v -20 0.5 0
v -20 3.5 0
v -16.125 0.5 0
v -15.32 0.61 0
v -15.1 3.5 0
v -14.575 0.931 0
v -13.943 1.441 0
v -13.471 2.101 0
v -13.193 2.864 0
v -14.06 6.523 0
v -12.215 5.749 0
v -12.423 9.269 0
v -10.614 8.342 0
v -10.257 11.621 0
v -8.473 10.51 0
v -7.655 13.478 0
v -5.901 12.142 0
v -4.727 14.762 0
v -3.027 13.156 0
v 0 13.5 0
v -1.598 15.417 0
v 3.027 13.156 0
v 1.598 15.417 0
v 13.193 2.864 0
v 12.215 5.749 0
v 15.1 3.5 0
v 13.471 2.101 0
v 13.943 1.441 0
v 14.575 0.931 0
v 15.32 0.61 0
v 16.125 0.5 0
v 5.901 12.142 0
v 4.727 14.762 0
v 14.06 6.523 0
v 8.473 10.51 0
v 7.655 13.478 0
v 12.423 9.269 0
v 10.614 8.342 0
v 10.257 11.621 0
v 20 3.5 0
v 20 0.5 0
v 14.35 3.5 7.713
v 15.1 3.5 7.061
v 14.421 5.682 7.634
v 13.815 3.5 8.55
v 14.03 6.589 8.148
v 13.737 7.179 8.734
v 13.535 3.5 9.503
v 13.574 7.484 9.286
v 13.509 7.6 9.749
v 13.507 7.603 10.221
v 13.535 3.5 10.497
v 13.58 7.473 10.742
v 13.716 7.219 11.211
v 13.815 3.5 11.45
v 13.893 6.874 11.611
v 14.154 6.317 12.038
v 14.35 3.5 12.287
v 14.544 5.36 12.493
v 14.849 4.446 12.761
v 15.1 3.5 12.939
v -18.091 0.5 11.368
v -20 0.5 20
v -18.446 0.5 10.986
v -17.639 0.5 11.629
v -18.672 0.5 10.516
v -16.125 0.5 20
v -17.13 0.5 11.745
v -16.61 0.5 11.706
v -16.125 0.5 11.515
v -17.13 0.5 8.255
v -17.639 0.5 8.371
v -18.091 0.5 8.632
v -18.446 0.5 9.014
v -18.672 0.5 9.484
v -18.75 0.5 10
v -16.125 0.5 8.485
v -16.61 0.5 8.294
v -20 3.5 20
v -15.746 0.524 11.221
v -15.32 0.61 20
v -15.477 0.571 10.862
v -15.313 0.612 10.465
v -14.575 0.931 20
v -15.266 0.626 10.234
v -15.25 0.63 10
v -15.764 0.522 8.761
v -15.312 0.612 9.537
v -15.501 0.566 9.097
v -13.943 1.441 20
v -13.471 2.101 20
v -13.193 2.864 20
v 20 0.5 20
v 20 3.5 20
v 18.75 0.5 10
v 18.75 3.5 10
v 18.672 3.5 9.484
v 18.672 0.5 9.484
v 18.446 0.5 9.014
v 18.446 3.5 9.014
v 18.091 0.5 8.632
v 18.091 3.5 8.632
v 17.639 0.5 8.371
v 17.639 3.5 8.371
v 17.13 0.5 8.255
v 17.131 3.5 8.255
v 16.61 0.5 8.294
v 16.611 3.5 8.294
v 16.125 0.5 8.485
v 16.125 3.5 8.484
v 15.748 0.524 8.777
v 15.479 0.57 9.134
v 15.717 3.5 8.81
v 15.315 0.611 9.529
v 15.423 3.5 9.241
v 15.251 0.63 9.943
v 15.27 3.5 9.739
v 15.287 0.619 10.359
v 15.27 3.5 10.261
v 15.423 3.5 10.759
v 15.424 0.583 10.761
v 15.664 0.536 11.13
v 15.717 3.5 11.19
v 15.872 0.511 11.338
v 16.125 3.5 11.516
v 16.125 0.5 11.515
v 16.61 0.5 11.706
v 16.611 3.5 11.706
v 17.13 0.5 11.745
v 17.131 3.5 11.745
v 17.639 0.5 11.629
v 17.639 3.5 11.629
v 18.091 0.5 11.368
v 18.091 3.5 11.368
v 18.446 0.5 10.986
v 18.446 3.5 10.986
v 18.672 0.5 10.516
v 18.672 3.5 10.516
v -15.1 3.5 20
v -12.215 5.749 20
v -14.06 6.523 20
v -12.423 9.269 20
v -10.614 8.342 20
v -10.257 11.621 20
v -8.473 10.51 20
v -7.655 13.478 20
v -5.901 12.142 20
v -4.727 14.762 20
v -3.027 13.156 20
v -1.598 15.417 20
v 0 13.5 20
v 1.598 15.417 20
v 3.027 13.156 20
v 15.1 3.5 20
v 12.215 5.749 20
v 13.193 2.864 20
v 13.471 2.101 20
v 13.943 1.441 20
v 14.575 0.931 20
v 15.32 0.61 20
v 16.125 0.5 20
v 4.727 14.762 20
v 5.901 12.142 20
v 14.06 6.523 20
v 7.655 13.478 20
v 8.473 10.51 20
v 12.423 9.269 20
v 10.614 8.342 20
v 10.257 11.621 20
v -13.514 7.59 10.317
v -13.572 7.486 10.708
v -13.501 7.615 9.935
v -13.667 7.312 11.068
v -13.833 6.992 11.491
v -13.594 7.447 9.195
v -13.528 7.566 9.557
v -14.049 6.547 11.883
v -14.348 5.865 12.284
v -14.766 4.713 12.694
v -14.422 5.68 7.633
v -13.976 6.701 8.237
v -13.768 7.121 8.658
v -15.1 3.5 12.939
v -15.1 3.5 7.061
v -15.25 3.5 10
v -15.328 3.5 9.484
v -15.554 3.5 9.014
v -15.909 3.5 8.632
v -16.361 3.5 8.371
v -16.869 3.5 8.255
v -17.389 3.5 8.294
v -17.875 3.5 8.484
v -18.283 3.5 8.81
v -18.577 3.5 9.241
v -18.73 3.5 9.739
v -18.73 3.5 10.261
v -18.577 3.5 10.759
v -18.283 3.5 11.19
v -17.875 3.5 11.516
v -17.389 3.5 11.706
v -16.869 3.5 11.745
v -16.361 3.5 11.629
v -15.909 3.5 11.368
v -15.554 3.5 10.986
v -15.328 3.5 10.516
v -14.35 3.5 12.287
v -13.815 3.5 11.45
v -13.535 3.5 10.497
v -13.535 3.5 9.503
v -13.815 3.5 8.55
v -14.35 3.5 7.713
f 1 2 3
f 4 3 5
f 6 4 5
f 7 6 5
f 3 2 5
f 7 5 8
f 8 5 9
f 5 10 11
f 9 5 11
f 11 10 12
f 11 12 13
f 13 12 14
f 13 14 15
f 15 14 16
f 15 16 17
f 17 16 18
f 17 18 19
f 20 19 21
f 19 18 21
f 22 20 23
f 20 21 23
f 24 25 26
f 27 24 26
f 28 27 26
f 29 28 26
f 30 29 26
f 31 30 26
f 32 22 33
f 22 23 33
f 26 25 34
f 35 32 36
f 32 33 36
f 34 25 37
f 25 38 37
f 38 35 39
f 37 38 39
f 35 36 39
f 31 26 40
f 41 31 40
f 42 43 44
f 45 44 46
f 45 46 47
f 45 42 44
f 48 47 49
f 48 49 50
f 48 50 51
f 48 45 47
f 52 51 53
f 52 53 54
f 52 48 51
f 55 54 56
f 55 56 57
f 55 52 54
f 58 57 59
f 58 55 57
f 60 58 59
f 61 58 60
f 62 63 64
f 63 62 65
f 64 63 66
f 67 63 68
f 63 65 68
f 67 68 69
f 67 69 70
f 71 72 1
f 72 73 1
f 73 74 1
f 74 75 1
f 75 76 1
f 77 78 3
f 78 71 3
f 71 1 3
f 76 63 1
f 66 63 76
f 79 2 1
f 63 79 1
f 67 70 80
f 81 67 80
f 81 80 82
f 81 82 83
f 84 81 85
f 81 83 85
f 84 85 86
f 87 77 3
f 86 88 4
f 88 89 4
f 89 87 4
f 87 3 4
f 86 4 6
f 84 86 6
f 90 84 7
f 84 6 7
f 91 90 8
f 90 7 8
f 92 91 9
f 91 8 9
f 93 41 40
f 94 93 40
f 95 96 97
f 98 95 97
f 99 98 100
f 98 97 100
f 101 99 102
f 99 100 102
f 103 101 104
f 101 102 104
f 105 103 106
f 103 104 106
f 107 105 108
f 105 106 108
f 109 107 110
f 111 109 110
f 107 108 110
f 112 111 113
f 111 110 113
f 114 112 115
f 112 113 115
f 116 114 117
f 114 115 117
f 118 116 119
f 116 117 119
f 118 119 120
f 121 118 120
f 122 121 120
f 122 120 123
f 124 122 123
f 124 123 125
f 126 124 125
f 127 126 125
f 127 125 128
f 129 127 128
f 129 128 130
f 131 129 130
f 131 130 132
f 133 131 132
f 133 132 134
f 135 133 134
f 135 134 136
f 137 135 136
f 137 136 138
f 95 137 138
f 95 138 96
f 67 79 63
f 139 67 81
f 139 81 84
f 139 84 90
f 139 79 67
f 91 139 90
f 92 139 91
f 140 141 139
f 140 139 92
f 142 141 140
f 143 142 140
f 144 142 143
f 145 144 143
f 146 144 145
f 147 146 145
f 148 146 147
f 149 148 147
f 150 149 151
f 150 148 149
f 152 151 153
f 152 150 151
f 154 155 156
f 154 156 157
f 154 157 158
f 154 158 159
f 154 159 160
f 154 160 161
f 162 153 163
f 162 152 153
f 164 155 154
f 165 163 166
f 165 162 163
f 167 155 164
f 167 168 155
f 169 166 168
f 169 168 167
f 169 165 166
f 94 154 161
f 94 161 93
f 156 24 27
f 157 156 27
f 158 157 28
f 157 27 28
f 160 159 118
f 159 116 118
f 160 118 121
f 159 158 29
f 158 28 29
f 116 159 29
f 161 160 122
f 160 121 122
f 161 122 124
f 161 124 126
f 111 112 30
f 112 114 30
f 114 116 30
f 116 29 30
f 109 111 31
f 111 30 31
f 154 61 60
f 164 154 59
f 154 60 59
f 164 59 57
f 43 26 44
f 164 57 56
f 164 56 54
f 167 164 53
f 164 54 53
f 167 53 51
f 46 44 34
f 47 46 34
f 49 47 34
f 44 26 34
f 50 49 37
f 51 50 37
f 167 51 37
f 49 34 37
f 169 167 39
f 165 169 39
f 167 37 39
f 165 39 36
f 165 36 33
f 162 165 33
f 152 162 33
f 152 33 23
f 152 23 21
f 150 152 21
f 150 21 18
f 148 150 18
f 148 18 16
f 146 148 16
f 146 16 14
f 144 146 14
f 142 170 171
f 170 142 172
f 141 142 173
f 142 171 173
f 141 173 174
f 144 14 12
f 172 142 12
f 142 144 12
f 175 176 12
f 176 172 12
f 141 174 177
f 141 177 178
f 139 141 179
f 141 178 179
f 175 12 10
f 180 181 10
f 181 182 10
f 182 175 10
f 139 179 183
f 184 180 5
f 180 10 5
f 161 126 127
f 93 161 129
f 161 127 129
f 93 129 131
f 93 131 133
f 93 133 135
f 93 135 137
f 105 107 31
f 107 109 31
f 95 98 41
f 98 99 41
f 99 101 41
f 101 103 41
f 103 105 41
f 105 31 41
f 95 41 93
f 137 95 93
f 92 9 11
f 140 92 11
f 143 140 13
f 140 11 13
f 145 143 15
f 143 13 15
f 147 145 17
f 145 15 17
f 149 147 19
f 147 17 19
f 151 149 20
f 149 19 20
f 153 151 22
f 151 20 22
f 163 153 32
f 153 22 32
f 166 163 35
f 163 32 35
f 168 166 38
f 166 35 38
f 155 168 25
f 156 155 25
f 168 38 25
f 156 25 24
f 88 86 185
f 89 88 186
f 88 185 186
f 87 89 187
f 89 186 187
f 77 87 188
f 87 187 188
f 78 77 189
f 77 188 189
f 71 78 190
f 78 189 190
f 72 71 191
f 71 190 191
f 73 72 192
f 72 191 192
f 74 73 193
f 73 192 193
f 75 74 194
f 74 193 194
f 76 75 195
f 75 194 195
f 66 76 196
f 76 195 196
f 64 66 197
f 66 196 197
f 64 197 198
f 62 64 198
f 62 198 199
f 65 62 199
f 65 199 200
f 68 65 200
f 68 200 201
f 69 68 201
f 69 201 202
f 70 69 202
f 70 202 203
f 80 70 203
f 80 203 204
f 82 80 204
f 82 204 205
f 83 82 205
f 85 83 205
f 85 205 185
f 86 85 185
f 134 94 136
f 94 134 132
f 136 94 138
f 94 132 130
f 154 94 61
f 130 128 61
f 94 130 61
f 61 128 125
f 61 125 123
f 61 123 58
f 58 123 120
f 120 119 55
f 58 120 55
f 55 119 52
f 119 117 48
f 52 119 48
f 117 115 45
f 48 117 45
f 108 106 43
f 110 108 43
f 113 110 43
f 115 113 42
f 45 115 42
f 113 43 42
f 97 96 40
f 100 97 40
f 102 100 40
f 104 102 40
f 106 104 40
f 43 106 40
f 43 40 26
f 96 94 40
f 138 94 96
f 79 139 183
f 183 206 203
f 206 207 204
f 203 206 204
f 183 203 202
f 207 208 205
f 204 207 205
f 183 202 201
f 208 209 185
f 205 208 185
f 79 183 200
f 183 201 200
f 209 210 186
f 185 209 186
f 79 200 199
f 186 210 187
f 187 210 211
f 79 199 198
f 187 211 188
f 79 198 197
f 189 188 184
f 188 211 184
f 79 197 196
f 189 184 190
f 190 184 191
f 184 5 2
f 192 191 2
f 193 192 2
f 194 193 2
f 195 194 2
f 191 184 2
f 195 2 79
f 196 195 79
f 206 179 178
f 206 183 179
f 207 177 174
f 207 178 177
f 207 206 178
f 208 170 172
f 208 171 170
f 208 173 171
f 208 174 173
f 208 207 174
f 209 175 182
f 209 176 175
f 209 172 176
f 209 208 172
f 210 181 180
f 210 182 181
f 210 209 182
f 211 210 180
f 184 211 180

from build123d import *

# Parameters (mm, degrees)
BOSS_EXTRU_2_DEPTH      = 20
ESQUISSE3_R             = 1.75
ENL_V_MAT_EXTRU_2_DEPTH = 4
ESQUISSE4_R             = 3.5
ENL_V_MAT_EXTRU_3_DEPTH = 13


with BuildPart() as part:
    # Esquisse1 → Boss.-Extru.2 (new body)
    with BuildSketch(Plane.XY):
        with BuildLine():
            Line((-20, 0.5), (-16.124515497, 0.5))
            ThreePointArc((-16.124515497, 0.5), (-14.241577753, 1.164503168), (-13.192785406, 2.863636364))
            ThreePointArc((-13.192785406, 2.863636364), (0, 13.5), (13.192785406, 2.863636364))
            ThreePointArc((13.192785406, 2.863636364), (14.241577753, 1.164503168), (16.124515497, 0.5))
            Line((16.124515497, 0.5), (20, 0.5))
            Line((20, 0.5), (20, 3.5))
            Line((20, 3.5), (15.099668871, 3.5))
            ThreePointArc((15.099668871, 3.5), (0, 15.5), (-15.099668871, 3.5))
            Line((-15.099668871, 3.5), (-20, 3.5))
            Line((-20, 3.5), (-20, 0.5))
        make_face()
    extrude(amount=BOSS_EXTRU_2_DEPTH)

    # Esquisse3 → Enlèv. mat.-Extru.2 (cut, through all)
    with BuildSketch(Plane(origin=(0, 3.5, 0), x_dir=(1, 0, 0), z_dir=(0, 1, 0))):
        with Locations((-17, -10)):
            Circle(ESQUISSE3_R)
        with Locations((17, -10)):
            Circle(ESQUISSE3_R)
    extrude(amount=-ENL_V_MAT_EXTRU_2_DEPTH, mode=Mode.SUBTRACT)

    # Esquisse4 → Enlèv. mat.-Extru.3 (cut, through all)
    with BuildSketch(Plane(origin=(0, 3.5, 0), x_dir=(1, 0, 0), z_dir=(0, 1, 0))):
        with Locations((-17, -10)):
            Circle(ESQUISSE4_R)
        with Locations((17, -10)):
            Circle(ESQUISSE4_R)
    extrude(amount=ENL_V_MAT_EXTRU_3_DEPTH, mode=Mode.SUBTRACT)


solid = part.part
